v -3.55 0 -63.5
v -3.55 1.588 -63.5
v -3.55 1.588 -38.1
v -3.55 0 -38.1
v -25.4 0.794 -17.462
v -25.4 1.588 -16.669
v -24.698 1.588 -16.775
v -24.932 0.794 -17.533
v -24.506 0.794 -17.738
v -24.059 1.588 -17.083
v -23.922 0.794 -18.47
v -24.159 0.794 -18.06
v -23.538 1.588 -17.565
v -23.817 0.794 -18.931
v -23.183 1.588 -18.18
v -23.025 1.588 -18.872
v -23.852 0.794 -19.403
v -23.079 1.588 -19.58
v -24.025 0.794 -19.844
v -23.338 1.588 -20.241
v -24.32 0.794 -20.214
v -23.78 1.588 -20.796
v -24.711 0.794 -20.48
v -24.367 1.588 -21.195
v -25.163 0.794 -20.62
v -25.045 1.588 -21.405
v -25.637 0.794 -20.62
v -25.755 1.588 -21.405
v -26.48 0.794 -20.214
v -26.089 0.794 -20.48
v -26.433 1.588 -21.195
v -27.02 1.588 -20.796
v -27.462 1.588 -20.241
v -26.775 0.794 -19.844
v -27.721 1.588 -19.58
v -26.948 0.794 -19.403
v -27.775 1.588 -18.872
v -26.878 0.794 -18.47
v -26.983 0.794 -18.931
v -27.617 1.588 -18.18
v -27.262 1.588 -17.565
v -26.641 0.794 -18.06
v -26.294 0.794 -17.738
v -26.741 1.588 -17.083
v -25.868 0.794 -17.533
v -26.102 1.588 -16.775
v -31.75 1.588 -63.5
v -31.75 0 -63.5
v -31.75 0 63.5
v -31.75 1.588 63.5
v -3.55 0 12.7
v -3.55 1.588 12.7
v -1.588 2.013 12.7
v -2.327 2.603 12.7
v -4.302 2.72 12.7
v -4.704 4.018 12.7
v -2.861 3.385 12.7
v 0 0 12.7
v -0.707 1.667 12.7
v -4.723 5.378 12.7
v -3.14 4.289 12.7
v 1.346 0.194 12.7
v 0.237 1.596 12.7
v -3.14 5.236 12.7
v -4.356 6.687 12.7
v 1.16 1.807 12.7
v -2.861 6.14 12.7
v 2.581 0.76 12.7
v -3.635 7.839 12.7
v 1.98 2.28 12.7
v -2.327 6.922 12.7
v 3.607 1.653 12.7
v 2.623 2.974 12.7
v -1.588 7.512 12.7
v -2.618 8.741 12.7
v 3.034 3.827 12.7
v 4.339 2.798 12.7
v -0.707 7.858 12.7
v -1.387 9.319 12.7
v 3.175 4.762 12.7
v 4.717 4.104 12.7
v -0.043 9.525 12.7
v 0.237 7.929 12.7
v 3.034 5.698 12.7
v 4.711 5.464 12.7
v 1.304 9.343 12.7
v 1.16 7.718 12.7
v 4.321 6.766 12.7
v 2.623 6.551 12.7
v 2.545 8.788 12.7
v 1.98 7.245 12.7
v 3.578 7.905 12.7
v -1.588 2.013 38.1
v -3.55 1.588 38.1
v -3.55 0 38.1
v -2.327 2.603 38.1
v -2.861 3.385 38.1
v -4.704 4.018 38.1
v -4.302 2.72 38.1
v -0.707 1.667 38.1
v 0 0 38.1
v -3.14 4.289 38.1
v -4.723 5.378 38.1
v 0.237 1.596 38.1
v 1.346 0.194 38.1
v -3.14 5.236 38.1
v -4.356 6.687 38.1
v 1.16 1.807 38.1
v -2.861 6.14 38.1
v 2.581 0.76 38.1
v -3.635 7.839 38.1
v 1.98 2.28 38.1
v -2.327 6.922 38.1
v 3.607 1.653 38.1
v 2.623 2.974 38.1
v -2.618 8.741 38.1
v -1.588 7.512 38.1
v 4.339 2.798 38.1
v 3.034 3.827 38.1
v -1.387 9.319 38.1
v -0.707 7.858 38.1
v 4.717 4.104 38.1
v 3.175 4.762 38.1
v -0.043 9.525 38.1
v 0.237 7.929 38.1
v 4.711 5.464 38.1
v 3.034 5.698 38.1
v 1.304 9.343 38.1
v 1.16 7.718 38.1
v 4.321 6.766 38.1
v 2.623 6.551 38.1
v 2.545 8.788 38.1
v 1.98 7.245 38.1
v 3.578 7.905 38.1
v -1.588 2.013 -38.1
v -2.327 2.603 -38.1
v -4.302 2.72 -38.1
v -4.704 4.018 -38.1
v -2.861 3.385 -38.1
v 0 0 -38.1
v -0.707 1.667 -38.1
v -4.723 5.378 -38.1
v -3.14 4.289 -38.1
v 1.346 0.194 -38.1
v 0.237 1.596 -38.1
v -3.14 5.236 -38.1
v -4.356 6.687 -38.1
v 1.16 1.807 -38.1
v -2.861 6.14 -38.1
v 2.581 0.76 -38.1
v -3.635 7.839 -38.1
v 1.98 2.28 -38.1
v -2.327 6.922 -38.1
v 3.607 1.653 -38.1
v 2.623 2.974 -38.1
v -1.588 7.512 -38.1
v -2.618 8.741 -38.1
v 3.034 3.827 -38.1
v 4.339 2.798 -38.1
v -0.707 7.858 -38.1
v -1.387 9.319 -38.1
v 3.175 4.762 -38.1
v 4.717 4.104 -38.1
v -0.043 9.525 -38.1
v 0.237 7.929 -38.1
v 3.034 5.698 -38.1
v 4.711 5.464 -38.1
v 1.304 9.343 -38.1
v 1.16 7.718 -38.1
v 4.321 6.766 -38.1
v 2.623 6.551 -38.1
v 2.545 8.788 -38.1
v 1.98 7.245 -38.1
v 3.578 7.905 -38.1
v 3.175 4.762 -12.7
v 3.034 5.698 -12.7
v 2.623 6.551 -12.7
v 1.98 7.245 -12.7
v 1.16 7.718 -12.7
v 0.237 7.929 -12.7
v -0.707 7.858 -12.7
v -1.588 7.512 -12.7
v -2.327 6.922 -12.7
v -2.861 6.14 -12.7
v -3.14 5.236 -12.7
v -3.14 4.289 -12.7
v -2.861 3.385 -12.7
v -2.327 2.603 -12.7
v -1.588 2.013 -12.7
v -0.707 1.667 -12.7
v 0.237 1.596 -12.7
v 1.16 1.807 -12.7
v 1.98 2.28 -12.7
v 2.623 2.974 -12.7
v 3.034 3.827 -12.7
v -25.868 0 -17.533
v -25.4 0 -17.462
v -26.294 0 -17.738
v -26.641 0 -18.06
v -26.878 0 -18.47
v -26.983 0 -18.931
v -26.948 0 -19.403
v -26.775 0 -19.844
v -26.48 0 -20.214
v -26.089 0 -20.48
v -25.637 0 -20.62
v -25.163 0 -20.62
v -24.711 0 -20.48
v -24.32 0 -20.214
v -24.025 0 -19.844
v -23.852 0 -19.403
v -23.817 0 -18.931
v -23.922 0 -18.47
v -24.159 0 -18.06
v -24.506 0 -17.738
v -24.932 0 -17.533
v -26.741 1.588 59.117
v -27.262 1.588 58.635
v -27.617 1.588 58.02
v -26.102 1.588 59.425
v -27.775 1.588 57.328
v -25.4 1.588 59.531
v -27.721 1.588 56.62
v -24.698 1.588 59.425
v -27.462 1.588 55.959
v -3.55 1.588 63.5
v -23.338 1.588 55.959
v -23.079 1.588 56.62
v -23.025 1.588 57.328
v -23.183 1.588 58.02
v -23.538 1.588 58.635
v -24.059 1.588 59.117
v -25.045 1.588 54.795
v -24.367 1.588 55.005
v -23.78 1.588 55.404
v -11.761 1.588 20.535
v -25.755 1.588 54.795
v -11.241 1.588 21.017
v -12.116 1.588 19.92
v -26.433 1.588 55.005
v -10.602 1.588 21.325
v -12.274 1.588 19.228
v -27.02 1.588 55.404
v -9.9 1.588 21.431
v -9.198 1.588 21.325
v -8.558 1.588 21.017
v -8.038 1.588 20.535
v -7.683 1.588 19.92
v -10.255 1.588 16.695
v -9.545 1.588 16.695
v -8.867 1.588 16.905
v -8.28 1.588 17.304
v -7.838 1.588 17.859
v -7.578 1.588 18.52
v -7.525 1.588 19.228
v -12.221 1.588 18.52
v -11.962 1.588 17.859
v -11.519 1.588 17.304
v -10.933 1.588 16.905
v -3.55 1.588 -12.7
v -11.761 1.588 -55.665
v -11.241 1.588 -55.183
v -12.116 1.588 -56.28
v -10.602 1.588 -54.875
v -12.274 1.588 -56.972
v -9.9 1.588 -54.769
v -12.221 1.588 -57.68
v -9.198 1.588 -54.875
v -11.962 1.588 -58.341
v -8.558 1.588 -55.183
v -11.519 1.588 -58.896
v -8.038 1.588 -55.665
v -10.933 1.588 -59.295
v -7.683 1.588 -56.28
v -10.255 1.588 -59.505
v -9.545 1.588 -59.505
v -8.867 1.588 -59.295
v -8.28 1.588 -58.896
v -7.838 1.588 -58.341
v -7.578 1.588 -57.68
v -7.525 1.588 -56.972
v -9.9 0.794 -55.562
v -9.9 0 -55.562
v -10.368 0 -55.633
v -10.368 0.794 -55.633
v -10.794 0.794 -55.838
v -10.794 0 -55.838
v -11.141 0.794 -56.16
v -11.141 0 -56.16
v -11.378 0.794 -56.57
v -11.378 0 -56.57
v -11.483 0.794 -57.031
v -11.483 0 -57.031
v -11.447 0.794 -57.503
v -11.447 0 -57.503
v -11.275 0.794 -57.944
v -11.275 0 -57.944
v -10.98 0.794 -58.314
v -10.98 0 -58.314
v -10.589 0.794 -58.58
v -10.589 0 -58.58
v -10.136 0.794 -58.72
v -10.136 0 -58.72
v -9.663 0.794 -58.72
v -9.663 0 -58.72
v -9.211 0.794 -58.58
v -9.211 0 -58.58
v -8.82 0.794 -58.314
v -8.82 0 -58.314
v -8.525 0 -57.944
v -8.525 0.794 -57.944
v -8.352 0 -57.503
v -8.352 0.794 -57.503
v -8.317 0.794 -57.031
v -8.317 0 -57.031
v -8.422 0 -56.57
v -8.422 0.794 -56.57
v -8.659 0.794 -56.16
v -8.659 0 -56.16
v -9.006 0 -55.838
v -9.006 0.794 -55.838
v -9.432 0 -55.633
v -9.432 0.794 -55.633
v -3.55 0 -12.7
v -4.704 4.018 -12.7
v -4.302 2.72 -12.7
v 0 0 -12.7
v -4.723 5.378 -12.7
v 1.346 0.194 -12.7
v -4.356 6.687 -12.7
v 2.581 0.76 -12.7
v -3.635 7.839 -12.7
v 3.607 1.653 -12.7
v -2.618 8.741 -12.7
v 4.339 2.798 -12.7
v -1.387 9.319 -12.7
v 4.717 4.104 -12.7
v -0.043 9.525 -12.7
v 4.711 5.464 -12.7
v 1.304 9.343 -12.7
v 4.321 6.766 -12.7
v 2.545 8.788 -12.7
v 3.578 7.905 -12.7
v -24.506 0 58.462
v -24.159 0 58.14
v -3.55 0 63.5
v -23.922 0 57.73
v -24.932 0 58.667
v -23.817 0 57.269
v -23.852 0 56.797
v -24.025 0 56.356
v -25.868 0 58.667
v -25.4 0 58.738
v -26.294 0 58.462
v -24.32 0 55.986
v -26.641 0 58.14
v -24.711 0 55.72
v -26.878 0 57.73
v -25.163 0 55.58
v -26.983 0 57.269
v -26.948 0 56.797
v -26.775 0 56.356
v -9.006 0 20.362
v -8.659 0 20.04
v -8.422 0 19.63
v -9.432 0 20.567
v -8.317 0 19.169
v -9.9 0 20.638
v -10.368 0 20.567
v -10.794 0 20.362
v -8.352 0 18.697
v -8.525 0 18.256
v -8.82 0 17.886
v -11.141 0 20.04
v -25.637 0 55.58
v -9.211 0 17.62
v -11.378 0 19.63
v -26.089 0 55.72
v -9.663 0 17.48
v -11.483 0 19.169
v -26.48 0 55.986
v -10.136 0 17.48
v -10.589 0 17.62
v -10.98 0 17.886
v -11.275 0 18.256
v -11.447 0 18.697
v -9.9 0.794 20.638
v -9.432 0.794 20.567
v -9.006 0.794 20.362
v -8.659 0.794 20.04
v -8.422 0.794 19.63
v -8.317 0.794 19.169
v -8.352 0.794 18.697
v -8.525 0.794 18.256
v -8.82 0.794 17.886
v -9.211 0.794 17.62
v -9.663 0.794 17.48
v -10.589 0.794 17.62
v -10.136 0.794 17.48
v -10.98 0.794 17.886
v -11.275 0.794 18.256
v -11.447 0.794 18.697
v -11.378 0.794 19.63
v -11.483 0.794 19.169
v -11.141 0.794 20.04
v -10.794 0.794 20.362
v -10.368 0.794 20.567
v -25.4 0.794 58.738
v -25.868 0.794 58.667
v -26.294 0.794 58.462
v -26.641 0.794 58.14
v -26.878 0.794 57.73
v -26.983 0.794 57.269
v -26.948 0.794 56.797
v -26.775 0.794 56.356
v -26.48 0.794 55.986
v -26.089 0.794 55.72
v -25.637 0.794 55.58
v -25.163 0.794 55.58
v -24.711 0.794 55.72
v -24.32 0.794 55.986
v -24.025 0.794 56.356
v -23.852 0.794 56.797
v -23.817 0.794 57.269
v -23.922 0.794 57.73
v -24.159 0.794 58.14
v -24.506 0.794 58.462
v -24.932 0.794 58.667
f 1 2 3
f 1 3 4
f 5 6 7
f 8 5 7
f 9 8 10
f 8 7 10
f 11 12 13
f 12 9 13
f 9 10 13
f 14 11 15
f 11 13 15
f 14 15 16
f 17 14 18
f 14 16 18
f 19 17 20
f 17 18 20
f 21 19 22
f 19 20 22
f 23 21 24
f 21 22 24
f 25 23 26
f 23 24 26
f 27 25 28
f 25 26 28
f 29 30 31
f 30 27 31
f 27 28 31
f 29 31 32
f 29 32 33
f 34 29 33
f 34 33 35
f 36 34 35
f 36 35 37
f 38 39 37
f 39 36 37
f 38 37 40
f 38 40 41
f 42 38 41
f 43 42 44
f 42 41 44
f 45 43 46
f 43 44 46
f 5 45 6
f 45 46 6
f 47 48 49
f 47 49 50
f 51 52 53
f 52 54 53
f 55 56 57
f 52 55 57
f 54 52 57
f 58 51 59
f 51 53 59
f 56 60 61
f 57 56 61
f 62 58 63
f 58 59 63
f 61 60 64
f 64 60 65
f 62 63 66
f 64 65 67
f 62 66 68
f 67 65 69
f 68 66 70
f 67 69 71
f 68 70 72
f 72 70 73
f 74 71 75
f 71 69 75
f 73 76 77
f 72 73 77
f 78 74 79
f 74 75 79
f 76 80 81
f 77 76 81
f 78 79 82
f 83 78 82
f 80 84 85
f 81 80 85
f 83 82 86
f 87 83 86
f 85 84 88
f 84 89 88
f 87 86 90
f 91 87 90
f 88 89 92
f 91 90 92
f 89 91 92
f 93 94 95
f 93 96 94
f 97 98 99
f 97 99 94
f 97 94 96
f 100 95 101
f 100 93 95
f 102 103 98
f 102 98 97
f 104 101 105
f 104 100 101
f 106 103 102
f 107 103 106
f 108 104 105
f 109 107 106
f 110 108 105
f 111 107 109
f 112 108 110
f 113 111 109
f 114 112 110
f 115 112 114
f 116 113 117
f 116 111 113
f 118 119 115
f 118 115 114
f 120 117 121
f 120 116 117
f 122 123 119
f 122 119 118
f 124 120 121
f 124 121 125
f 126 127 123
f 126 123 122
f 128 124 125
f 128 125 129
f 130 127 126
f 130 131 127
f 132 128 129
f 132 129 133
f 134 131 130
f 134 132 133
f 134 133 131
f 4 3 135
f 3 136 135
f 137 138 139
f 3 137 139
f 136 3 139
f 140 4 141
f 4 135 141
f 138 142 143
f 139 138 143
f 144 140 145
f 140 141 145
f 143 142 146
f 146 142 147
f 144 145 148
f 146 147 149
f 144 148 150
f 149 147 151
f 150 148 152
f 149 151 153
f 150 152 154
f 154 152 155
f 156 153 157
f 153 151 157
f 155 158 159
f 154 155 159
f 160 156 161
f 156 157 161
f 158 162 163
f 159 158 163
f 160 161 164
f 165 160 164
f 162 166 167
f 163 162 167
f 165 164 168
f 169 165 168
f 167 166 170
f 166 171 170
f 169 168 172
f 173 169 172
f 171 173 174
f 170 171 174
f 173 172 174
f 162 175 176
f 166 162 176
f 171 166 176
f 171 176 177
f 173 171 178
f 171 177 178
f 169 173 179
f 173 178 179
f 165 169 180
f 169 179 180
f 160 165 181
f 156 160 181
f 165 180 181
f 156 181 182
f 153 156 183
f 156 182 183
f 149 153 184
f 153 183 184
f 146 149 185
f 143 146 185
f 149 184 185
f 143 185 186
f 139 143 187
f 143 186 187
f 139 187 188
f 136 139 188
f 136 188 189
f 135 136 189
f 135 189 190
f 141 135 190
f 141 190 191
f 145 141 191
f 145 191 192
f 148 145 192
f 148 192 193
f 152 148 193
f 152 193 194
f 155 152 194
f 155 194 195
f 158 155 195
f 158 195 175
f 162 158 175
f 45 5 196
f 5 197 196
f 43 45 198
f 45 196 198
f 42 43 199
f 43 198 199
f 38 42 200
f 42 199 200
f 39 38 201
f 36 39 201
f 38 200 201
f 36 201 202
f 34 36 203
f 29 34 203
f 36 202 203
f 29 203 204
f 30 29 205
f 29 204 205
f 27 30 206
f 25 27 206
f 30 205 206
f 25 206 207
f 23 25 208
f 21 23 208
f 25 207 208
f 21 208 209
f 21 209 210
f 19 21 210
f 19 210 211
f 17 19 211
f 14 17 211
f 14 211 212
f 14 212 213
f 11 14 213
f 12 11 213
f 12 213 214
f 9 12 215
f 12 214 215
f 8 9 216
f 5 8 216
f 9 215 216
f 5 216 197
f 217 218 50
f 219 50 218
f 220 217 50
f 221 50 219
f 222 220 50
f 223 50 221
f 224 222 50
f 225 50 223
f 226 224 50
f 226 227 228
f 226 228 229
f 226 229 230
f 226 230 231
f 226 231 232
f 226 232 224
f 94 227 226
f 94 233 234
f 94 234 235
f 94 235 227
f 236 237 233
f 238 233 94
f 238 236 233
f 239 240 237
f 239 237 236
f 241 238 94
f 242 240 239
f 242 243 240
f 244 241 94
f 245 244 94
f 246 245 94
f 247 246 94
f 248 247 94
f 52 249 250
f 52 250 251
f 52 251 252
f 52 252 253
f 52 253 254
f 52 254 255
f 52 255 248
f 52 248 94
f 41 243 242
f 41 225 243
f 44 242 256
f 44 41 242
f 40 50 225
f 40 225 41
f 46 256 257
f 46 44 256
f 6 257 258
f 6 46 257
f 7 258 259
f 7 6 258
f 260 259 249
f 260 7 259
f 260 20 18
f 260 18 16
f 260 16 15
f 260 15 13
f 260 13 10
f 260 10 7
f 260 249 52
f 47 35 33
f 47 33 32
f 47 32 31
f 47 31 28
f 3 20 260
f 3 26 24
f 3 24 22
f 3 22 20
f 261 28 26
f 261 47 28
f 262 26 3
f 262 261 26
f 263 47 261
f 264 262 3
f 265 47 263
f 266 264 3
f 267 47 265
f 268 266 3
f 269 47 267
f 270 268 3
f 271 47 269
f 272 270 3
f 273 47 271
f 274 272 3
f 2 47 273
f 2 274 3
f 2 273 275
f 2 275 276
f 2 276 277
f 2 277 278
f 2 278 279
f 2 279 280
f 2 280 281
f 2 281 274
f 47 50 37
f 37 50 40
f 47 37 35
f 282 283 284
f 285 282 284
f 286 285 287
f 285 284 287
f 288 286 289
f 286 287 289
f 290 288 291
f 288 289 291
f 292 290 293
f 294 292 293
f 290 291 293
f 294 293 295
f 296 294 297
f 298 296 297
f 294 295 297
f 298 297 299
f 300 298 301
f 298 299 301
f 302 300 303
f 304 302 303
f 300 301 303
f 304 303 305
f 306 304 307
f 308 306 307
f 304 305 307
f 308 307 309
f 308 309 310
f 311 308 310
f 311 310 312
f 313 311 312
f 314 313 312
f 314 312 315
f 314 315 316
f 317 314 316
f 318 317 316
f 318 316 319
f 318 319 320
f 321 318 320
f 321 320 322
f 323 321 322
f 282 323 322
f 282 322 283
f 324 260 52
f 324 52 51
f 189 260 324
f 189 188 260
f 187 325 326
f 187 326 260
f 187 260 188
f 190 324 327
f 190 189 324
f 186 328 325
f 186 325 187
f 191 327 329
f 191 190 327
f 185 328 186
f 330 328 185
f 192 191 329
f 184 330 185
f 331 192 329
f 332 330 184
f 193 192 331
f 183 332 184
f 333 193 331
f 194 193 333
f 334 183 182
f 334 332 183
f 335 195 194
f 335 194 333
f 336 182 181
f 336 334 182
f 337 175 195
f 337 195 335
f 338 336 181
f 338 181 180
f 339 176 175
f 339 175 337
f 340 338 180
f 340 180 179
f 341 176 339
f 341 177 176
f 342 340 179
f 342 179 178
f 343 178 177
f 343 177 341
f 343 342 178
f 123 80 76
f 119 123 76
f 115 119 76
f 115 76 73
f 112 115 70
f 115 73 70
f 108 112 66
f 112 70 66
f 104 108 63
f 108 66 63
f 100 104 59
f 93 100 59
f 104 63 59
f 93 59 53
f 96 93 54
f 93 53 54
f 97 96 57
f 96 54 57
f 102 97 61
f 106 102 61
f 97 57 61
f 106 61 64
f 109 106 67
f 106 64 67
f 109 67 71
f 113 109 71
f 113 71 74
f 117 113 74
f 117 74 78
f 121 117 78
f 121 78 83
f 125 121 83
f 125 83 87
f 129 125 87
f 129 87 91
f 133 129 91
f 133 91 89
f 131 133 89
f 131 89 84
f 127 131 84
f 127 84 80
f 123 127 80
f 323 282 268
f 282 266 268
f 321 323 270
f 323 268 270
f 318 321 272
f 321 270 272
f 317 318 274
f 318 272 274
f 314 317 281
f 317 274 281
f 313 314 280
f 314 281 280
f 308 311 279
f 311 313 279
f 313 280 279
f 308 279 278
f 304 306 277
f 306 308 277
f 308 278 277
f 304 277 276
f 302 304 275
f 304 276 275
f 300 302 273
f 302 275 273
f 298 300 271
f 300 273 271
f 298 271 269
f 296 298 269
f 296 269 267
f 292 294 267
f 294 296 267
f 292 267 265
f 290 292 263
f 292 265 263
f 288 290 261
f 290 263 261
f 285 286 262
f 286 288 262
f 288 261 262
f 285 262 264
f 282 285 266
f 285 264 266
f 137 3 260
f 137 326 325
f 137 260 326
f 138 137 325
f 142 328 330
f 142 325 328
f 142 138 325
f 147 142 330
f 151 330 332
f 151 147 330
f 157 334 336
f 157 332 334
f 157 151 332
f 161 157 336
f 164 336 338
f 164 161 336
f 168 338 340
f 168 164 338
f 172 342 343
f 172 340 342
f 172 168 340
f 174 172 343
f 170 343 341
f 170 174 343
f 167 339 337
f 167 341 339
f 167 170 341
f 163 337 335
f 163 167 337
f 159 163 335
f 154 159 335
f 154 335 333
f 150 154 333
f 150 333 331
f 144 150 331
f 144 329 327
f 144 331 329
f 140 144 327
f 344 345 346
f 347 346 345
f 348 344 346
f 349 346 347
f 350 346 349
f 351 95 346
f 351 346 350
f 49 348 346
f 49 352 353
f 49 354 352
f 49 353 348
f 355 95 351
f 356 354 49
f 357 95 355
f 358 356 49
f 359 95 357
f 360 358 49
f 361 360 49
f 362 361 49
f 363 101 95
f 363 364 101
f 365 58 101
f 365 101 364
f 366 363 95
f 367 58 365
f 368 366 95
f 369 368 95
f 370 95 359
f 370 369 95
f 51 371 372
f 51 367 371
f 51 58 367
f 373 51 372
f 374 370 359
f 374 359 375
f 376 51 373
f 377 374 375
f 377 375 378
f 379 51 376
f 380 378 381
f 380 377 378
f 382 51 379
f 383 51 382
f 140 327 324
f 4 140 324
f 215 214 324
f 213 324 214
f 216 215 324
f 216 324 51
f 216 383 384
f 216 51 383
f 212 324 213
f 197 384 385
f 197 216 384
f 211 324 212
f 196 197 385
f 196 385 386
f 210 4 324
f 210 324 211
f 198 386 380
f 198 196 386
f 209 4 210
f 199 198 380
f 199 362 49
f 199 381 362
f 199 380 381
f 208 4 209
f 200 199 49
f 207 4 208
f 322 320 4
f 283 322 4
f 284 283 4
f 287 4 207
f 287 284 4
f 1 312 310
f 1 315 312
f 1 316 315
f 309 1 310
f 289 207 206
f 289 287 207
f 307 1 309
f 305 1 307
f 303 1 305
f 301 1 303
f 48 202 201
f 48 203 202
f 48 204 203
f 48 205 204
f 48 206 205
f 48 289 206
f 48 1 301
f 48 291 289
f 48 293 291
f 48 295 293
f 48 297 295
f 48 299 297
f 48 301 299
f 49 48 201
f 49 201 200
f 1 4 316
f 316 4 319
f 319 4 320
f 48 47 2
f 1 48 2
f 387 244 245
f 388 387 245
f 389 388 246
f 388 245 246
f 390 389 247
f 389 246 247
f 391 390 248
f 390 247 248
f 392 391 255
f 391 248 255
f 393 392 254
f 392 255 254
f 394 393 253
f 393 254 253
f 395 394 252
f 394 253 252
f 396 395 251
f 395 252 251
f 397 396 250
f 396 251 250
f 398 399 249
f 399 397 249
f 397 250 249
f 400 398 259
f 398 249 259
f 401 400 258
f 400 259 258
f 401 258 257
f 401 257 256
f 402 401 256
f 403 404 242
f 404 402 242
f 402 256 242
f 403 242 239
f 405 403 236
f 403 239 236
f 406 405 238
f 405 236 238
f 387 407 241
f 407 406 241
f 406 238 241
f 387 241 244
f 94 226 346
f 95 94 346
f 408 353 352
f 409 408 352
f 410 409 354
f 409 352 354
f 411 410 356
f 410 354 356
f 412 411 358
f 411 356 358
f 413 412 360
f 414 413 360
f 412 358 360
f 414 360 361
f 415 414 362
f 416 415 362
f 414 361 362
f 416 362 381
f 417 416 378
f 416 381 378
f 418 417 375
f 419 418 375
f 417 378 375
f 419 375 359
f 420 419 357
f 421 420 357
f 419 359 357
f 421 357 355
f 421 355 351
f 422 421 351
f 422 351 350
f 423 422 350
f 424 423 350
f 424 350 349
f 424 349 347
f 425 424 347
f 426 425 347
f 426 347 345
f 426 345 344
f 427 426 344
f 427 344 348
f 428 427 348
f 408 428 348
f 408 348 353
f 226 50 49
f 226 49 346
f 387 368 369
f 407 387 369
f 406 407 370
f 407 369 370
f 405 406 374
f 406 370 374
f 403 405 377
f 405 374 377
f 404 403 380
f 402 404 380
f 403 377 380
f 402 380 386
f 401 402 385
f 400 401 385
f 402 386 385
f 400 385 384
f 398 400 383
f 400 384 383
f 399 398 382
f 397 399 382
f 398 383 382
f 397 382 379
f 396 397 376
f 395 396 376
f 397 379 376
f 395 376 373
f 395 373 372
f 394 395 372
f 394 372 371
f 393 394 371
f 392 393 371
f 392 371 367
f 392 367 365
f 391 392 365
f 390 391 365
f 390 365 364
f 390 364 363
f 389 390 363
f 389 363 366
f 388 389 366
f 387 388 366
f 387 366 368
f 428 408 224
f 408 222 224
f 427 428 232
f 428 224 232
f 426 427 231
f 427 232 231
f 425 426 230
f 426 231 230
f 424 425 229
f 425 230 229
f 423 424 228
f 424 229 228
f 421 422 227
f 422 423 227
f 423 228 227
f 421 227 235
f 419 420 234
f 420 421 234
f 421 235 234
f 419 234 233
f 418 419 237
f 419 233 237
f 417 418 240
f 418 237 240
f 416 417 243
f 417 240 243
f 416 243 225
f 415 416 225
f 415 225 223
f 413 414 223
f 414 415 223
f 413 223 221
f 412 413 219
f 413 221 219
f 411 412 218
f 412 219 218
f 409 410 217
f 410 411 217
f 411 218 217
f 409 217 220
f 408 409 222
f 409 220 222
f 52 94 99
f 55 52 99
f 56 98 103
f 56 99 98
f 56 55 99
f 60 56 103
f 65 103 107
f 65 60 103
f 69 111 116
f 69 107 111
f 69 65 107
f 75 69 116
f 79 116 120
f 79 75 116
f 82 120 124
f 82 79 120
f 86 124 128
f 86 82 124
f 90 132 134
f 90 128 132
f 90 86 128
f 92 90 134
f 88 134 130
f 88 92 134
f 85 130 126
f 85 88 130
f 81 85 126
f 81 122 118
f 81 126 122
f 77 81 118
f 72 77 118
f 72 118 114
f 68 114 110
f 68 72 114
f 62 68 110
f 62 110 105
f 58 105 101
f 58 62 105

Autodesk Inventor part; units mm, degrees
ref_plane "YZ Plane" through (0, 0, 0) normal (1, 0, 0) x (0, 1, 0)
ref_plane "XZ Plane" through (0, 0, 0) normal (0, 1, 0) x (-1, 0, 0)
sketch "Sketch1" plane through (0, 0, 0) normal (0, 0, 1) x (1, 0, 0)
  line L0 (0, 0) -> (-31.75, 0)
  line L1 (-31.75, 0) -> (-31.75, 1.5875)
  line L2 (-31.75, 1.5875) -> (0, 1.5875)
  line L3 (0, 1.5875) -> (0, 0)
  circle A0 centre (0, 4.7625) radius 4.7625
  circle A1 centre (0, 4.7625) radius 3.175
  dimension "d0" = 31.75
  dimension "d1" = 1.5875
  dimension "d2" = 9.525
  dimension "d3" = 6.35
extrude "Extrusion1" add sketch "Sketch1" along normal mid plane 127
ref_plane "Work Plane1" through (0, 0, 38.1) normal (0, 0, 1) x (1, 0, 0)
sketch "Sketch2" plane through (0, 0, 38.1) normal (0, 0, 1) x (1, 0, 0)
  arc A0 (0, 0) -> (-3.5498, 1.5875) centre (0, 4.7625) ccw projected
  line L0 (-3.5498, 1.5875) -> (-3.5498, 0)
  line L1 (-3.5498, 0) -> (0, 0)
extrude "Extrusion2" cut sketch "Sketch2" along normal blind 25.4
pattern_linear "Rectangular Pattern1" count 3 spacing 50.8 along (0, 0, -1) of "Extrusion2"
sketch "Sketch3" plane through (-31.75, 1.5875, -63.5) normal (0, 1, 0) x (1, 0, 0)
  line L0 (28.2002, 0) -> (0, 0) construction
  line L1 (0, -127) -> (28.2002, -127) construction
  line L2 (0, 0) -> (28.2002, 0) construction
  line L3 (28.2002, 0) -> (28.2002, -127) construction
  line L4 (28.2002, -127) -> (0, -127) construction
  line L5 (0, -127) -> (0, 0) construction
  line L6 (21.8502, -120.65) -> (21.8502, -6.35) construction
  line L7 (21.8502, -6.35) -> (6.35, -6.35) construction
  line L8 (6.35, -6.35) -> (6.35, -120.65) construction
  line L9 (6.35, -120.65) -> (21.8502, -120.65) construction
  line L10 (6.35, -82.55) -> (21.8502, -82.55) construction
  line L11 (6.35, -44.45) -> (21.8502, -44.45) construction
  line L12 (6.35, -6.35) -> (21.8502, -6.35) construction
  point P0 (31.75, -63.5)
  dimension "d12" = 6.35
  dimension "d15" = 114.3
hole "Hole1" at (-9.8998, 1.5875, -57.15) at (-25.4, 1.5875, 57.15) at (-9.8998, 1.5875, 19.05) at (-25.4, 1.5875, -19.05) direction (0, -1, 0) diameter 3.175 end through all
chamfer "Chamfer1" distance 0.7937 angle 45 4 edges at (-25.4, 1.5875, 55.5625) (-9.8998, 1.5875, 17.4625) (-25.4, 1.5875, -20.6375) (-9.8998, 1.5875, -58.7375)
